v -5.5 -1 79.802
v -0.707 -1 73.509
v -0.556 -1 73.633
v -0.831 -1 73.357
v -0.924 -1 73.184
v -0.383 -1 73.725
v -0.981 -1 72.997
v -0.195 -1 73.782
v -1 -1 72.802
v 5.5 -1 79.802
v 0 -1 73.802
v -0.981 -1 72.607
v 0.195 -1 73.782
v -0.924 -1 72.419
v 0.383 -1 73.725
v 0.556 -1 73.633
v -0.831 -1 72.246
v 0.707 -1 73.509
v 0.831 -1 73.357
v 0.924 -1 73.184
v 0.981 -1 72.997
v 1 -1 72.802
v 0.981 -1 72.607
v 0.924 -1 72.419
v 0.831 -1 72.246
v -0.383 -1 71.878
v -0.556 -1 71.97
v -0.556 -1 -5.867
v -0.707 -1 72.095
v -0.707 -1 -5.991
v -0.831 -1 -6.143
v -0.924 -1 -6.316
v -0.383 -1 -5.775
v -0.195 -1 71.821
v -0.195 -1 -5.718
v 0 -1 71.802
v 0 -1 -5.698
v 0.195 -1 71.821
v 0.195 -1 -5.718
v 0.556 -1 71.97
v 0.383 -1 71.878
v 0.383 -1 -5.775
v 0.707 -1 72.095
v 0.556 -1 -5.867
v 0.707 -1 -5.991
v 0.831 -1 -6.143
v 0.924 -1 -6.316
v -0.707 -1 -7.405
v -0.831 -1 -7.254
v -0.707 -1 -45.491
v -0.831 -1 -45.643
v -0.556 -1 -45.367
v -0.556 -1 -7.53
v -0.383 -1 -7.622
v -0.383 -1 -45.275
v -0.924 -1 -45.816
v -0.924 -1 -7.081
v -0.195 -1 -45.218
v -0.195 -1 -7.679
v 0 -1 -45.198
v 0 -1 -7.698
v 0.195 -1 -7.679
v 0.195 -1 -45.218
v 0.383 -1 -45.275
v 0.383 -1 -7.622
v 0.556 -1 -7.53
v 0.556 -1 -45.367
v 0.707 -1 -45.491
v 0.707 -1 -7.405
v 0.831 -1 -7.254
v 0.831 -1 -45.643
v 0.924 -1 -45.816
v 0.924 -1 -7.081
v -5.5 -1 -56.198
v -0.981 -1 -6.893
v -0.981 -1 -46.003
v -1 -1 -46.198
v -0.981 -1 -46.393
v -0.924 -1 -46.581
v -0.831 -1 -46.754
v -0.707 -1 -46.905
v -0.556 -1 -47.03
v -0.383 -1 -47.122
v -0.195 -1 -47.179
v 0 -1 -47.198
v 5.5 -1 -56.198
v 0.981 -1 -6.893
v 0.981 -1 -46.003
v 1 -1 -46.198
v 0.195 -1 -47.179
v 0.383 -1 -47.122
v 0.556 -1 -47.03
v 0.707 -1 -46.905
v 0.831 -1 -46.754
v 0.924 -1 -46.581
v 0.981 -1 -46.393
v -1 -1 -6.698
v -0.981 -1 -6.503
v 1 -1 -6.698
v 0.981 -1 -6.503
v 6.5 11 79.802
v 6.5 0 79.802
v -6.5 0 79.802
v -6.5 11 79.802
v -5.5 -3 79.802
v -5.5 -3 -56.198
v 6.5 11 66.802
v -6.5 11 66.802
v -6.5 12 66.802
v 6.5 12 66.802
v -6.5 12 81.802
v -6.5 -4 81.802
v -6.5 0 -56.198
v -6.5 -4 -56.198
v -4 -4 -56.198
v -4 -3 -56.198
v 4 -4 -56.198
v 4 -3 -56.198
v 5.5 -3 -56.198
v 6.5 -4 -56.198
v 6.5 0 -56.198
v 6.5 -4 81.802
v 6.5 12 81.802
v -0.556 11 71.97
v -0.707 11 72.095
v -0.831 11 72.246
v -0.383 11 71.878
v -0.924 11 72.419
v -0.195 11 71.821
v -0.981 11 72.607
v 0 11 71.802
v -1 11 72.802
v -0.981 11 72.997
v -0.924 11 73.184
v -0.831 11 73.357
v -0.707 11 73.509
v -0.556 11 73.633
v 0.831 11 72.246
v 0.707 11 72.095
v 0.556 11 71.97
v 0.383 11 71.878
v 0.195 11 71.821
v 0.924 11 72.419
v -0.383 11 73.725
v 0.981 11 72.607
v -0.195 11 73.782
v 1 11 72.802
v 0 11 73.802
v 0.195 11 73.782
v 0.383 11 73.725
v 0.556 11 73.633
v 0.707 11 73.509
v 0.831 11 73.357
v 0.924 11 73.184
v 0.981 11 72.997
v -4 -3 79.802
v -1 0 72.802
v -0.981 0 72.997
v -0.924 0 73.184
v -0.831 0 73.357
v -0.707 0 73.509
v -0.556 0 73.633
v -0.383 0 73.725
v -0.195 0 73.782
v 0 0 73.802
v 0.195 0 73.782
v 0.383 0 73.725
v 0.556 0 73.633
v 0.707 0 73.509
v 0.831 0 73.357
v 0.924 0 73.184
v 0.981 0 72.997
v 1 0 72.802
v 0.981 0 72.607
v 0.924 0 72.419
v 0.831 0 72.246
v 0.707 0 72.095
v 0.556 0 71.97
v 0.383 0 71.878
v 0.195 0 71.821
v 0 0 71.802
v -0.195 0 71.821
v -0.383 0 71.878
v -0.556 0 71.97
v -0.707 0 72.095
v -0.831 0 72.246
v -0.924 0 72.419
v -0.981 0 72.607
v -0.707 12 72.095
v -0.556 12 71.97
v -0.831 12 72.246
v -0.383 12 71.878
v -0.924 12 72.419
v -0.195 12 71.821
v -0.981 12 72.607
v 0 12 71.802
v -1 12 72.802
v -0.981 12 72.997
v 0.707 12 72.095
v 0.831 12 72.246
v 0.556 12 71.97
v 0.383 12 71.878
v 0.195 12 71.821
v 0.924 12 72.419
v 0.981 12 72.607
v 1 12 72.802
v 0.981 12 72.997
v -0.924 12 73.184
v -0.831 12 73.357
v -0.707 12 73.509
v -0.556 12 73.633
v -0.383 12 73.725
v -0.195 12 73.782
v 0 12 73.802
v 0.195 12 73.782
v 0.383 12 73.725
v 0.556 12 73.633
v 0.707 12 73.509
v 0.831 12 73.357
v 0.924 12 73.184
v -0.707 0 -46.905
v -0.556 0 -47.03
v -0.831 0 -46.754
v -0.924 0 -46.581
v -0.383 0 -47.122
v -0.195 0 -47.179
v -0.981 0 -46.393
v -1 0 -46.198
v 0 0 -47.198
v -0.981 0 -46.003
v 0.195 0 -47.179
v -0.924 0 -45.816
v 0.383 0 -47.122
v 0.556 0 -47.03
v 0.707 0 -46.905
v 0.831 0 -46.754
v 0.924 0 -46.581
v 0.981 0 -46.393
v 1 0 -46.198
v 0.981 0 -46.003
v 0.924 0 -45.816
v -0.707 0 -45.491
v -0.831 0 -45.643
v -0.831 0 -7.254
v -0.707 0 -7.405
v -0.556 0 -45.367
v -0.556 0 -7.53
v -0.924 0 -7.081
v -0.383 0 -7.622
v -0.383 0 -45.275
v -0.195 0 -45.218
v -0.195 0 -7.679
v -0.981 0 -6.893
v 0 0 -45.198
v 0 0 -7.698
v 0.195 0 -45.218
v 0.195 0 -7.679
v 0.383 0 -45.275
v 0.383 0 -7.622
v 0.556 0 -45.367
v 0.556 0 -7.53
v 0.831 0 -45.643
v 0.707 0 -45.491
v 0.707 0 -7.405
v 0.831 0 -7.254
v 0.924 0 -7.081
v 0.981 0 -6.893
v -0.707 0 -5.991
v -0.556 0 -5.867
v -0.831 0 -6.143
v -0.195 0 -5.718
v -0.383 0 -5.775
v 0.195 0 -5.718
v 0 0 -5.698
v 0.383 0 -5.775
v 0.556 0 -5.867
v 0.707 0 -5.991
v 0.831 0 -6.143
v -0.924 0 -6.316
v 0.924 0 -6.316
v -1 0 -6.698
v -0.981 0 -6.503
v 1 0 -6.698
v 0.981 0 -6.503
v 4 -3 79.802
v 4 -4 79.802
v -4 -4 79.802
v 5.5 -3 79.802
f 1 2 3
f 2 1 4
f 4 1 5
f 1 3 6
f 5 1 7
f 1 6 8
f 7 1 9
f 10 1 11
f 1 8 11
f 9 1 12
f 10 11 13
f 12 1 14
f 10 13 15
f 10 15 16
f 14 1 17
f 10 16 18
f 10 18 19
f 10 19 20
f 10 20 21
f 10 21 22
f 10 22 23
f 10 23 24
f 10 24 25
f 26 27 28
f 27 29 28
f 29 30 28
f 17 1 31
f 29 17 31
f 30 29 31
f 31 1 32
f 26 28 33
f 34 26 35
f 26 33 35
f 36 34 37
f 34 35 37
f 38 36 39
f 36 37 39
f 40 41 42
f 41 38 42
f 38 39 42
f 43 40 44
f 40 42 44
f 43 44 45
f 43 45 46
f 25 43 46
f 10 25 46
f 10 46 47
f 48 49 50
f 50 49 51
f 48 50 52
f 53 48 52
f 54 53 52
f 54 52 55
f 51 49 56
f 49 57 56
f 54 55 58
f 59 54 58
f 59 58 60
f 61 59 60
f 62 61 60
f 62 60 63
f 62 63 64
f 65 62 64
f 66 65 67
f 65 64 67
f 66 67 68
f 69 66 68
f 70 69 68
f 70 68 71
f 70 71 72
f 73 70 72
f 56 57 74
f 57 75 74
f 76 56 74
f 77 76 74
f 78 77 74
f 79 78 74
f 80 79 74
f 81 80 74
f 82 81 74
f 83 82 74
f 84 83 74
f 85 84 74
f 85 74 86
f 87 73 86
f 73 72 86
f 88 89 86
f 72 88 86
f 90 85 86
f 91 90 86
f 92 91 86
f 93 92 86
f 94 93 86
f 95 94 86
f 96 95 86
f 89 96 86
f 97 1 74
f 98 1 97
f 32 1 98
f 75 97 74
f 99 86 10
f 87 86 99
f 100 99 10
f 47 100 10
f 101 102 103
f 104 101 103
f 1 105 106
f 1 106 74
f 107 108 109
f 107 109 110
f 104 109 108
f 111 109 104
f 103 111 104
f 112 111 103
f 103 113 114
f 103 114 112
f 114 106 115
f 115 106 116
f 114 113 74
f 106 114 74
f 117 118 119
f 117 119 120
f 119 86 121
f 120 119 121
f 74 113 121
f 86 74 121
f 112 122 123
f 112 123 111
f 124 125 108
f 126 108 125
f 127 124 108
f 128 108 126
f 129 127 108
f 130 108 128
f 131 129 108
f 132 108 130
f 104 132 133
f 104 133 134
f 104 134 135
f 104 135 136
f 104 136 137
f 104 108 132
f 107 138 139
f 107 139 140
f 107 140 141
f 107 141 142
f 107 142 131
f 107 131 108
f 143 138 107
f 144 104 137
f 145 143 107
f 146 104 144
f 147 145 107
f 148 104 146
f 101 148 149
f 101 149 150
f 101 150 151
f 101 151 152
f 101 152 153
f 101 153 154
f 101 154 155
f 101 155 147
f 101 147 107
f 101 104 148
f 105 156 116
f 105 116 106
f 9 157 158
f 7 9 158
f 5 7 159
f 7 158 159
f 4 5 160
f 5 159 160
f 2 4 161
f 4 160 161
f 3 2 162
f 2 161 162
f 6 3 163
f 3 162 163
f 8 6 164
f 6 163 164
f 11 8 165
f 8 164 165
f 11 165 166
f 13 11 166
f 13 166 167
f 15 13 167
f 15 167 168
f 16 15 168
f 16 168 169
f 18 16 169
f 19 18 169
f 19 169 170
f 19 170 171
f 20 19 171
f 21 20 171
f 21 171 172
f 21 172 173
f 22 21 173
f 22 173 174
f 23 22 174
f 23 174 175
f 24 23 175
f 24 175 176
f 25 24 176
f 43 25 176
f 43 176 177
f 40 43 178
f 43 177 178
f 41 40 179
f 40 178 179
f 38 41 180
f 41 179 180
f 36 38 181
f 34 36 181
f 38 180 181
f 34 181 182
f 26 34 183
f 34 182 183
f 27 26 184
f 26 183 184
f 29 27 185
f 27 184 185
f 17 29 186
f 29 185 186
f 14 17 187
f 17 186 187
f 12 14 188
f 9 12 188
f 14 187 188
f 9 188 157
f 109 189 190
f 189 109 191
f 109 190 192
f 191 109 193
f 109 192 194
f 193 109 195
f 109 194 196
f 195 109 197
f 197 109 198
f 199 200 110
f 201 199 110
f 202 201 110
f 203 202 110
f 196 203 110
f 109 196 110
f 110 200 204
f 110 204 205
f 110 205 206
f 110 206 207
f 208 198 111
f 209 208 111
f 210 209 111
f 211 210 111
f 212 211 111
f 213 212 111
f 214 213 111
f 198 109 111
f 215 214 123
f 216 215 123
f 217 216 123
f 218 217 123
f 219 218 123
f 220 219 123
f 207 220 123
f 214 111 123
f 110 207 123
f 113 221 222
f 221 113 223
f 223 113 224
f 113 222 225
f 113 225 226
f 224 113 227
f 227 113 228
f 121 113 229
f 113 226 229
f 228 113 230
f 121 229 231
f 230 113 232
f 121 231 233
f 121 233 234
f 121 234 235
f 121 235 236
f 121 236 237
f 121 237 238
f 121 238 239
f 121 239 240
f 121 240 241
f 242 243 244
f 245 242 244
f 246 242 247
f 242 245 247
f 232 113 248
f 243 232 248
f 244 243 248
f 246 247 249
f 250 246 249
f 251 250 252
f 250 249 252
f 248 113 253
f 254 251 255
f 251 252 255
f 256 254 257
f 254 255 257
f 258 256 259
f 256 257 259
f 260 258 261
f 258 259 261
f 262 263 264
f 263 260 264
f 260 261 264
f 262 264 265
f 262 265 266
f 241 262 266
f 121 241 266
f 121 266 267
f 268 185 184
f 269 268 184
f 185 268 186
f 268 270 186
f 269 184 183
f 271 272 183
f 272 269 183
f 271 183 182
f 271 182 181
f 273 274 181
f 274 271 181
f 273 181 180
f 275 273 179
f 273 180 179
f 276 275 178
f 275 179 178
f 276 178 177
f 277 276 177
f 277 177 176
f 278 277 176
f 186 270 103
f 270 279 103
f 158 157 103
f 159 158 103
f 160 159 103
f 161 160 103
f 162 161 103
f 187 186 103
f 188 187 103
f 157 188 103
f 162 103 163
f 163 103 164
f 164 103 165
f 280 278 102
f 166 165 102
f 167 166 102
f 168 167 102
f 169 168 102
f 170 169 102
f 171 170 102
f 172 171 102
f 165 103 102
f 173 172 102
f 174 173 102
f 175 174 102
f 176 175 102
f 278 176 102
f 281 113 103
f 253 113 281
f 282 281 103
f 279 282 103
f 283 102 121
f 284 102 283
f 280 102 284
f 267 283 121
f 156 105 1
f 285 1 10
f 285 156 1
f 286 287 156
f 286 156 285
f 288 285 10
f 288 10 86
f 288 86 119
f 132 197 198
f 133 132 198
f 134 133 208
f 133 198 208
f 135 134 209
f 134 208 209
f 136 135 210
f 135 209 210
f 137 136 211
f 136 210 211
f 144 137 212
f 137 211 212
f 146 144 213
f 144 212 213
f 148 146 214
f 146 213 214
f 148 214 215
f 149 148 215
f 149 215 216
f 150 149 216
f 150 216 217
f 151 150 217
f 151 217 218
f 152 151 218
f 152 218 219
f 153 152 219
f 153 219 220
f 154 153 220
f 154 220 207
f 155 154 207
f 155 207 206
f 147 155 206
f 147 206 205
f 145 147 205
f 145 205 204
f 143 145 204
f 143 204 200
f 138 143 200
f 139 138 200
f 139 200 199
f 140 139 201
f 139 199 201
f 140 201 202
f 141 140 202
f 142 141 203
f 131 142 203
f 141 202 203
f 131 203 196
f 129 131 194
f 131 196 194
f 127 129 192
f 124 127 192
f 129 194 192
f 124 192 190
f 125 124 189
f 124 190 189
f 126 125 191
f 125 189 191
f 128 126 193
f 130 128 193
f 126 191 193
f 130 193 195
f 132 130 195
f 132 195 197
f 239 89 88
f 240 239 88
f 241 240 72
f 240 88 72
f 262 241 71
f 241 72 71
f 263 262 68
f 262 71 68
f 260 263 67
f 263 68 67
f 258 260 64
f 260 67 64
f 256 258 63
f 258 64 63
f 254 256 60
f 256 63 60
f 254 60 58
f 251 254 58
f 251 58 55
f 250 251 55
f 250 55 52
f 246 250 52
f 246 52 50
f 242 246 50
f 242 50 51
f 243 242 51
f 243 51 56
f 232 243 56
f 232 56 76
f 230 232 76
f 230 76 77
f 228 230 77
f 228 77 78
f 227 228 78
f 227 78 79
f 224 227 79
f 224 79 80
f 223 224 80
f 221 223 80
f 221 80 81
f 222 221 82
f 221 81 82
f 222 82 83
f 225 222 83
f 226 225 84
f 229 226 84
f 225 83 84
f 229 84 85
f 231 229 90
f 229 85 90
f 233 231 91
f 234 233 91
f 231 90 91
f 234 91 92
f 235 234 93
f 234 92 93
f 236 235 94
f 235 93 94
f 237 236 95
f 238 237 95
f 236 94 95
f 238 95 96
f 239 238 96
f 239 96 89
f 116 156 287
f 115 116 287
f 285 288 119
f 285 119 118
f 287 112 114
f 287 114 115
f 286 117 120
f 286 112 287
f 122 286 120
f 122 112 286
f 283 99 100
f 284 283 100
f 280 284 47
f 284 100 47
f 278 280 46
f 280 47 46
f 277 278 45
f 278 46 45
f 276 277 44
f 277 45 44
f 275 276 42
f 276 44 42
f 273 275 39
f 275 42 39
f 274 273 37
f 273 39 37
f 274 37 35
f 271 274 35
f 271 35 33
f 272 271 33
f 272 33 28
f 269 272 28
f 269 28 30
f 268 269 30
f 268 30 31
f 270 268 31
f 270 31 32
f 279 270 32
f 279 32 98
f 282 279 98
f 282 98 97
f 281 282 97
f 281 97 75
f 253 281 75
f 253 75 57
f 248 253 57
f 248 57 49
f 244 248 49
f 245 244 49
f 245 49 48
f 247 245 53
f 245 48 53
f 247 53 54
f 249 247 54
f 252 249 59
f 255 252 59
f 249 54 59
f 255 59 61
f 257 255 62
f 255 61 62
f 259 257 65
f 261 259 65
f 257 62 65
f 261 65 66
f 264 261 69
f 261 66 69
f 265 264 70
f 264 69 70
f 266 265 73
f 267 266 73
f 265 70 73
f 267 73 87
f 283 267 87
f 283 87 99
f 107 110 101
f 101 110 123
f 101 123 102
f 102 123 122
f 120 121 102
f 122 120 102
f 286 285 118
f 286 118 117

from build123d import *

# Parameters (mm, degrees)
F0_W      = 13
F0_H      = 138
F1_DEPTH  = 4
F2_W      = 8
F2_H      = 1
F3_DEPTH  = 136
F4_R      = 1
F5_DEPTH  = 4.001
F6_R      = 1
F7_DEPTH  = 4.001
F8_W      = 13
F8_H      = 2
F9_DEPTH  = 12
F10_W     = 13
F10_H     = 1
F11_DEPTH = 13
F12_R     = 1
F13_DEPTH = 16.001


with BuildPart() as f1:
    # F0 (on Front) → F1 (new body)
    with BuildSketch(Plane.XZ):
        with Locations((0, 12.801612)):
            Rectangle(F0_W, F0_H)
    extrude(amount=F1_DEPTH)

    # F2 (on face) → F3 (cut)
    with BuildSketch(Plane(origin=(0, 0, -56.198388), x_dir=(1, 0, 0), z_dir=(0, 0, -1))):
        with Locations((0, 3.5)):
            Rectangle(F2_W, F2_H)
        Polygon((-5.5, 1), (-4, 1), (4, 1), (5.5, 1), (5.5, 3), (4, 3), (-4, 3), (-5.5, 3), align=None)
    extrude(amount=-F3_DEPTH, mode=Mode.SUBTRACT)

    # F4 (on face) → F5 (cut, through all)
    with BuildSketch(Plane.XZ.offset(4)):
        with Locations((0, -46.198388)):
            Circle(F4_R)
    extrude(amount=-F5_DEPTH, mode=Mode.SUBTRACT)

    # F6 (on face) → F7 (cut, through all)
    with BuildSketch(Plane.XZ.offset(4)):
        with Locations((0, -6.698388)):
            Circle(F6_R)
    extrude(amount=-F7_DEPTH, mode=Mode.SUBTRACT)

    # F8 (on face) → F9 (join)
    with BuildSketch(Plane(origin=(0, 0, 0), x_dir=(-1, 0, 0), z_dir=(0, 1, 0))):
        with Locations((0, 80.801612)):
            Rectangle(F8_W, F8_H)
    extrude(amount=F9_DEPTH)

    # F10 (on face) → F11 (join)
    with BuildSketch(Plane(origin=(0, 0, 79.801612), x_dir=(1, 0, 0), z_dir=(0, 0, -1))):
        with Locations((0, -11.5)):
            Rectangle(F10_W, F10_H)
    extrude(amount=F11_DEPTH)

    # F12 (on face) → F13 (cut, through all)
    with BuildSketch(Plane(origin=(0, 12, 0), x_dir=(-1, 0, 0), z_dir=(0, 1, 0))):
        with Locations((0, 72.801612)):
            Circle(F12_R)
    extrude(amount=-F13_DEPTH, mode=Mode.SUBTRACT)


solid = f1.part
